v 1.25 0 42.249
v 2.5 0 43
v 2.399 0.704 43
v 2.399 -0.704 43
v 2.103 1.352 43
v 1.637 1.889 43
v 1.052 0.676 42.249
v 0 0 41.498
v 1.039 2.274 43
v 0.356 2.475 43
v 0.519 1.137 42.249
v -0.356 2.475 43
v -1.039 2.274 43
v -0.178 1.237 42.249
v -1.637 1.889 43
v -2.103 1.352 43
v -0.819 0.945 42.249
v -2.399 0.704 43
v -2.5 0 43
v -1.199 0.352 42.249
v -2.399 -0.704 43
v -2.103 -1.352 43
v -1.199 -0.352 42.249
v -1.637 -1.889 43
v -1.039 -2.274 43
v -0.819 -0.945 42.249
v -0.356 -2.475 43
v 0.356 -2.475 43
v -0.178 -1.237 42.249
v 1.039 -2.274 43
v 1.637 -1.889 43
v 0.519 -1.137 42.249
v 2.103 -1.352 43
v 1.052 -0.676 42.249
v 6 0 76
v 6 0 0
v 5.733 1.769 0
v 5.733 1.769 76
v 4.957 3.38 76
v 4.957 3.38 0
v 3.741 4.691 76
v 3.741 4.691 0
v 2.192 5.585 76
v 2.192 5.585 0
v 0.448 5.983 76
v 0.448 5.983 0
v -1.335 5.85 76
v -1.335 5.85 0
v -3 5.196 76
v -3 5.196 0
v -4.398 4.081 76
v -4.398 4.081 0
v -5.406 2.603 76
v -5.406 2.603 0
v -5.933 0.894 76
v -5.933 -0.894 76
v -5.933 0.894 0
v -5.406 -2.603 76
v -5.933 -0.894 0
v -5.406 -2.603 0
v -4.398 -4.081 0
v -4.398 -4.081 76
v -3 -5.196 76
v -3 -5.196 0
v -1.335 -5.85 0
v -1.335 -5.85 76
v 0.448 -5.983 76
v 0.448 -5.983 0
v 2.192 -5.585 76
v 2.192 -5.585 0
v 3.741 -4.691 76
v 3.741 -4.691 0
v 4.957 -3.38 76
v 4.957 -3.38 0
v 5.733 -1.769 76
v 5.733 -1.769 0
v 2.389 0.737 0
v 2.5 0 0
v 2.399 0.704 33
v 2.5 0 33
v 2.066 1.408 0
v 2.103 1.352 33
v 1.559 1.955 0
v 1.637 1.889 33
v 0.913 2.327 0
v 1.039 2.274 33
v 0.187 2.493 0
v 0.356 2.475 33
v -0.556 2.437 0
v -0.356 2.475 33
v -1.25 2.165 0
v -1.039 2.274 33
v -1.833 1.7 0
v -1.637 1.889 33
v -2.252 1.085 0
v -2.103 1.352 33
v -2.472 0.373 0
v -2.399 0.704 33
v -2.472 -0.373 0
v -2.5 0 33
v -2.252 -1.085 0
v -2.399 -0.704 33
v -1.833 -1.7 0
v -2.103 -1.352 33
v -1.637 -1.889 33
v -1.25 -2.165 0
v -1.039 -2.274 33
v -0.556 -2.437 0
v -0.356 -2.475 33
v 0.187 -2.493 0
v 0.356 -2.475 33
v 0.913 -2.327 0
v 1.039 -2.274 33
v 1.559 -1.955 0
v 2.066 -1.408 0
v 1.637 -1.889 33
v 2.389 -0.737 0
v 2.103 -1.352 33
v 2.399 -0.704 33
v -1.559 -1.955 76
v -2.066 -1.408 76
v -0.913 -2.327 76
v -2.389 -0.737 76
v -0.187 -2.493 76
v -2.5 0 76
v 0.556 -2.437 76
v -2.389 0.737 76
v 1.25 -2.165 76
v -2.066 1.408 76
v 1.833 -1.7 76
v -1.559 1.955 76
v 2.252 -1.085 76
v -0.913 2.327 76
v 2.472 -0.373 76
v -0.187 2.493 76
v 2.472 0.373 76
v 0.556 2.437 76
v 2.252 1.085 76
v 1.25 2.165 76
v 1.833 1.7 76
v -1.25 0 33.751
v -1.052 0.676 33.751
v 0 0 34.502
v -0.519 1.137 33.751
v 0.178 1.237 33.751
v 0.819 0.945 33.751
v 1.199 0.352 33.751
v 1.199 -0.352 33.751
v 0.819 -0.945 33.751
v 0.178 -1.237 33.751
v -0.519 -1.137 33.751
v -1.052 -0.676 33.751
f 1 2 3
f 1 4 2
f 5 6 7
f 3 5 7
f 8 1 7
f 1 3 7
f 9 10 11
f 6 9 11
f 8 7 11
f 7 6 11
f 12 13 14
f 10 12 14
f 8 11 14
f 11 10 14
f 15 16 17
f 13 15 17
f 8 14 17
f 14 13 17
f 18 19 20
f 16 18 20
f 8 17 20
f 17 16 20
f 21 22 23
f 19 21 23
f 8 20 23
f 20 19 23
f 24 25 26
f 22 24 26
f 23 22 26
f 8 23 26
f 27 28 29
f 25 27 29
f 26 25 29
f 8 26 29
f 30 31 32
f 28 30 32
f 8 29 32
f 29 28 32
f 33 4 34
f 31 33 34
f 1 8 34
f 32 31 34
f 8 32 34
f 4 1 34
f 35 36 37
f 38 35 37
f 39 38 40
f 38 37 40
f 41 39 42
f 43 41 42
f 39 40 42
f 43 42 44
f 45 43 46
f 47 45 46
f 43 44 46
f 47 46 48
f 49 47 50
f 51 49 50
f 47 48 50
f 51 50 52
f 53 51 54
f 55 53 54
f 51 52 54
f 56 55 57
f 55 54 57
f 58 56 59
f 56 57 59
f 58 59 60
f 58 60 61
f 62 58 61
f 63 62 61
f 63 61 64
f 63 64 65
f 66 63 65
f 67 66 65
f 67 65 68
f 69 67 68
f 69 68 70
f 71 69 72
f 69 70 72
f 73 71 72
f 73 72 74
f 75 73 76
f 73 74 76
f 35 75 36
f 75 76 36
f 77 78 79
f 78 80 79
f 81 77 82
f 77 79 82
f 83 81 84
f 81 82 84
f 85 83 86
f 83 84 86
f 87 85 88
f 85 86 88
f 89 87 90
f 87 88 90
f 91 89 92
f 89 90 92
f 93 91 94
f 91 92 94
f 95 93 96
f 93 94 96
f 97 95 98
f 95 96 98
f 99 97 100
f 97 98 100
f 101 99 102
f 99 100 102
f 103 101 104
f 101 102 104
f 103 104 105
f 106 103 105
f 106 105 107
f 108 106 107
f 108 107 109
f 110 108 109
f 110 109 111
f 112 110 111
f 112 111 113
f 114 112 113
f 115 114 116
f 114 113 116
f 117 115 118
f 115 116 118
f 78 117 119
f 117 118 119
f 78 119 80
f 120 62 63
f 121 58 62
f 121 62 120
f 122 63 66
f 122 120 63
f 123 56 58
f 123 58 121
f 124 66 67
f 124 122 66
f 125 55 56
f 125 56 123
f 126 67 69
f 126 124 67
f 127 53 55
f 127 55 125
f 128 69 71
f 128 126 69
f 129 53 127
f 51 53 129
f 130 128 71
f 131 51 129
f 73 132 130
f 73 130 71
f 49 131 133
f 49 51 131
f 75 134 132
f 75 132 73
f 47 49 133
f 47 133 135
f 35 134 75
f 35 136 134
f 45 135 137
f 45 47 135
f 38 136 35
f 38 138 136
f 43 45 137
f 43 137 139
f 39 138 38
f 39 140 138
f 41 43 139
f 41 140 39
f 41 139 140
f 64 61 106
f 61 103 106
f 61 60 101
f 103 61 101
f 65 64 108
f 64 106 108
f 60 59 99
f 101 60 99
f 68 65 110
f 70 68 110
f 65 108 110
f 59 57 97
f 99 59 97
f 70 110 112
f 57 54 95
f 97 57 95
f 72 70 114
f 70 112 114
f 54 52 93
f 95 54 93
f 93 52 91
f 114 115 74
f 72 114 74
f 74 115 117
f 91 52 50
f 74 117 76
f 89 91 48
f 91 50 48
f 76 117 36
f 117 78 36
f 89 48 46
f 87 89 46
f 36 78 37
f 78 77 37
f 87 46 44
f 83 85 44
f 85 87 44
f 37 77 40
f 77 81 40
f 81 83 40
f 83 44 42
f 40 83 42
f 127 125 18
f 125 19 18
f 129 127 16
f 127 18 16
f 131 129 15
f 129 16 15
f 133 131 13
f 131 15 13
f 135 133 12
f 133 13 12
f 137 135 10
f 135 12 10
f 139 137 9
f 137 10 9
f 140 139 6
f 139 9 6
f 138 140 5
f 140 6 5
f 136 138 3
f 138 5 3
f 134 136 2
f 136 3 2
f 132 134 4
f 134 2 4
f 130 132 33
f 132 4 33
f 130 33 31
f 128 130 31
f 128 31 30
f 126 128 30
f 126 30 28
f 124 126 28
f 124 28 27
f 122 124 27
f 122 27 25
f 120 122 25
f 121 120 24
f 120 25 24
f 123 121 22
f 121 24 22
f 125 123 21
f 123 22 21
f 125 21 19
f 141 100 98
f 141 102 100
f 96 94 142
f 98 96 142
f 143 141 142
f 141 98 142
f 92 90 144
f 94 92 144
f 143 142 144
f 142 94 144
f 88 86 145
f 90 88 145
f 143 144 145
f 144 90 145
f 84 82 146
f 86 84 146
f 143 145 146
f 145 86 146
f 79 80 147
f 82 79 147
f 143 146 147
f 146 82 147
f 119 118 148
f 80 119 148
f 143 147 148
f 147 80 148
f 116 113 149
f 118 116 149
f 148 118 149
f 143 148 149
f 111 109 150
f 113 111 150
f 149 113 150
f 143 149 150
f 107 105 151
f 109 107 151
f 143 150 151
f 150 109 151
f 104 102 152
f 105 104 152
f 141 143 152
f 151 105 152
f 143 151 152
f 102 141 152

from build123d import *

# Parameters (mm, degrees)
SKETCH_1_R             = 6
EXTRUDE_1_DEPTH        = 76
HOLE_WIZARD_M6_1_D     = 5
HOLE_WIZARD_M6_1_DEPTH = 33
HOLE_WIZARD_M6_1_TIP   = 1.502151548
HOLE_WIZARD_M6_2_D     = 5
HOLE_WIZARD_M6_2_DEPTH = 33
HOLE_WIZARD_M6_2_TIP   = 1.502151548


with BuildPart() as part:
    # 草图1 → 凸台-拉伸1 (new body)
    with BuildSketch(Plane.XY):
        Circle(SKETCH_1_R)
    extrude(amount=EXTRUDE_1_DEPTH)

    # M6 螺纹孔1
    with Locations(Plane.XY.offset(76)):
        with Locations((0, 0)):
            Hole(HOLE_WIZARD_M6_1_D / 2, depth=HOLE_WIZARD_M6_1_DEPTH)
            with Locations((0, 0, -(HOLE_WIZARD_M6_1_DEPTH + HOLE_WIZARD_M6_1_TIP / 2))):  # 118° drill point
                Cone(0, HOLE_WIZARD_M6_1_D / 2, HOLE_WIZARD_M6_1_TIP, mode=Mode.SUBTRACT)

    # M6 螺纹孔2
    with Locations(Plane(origin=(0, 0, 0), x_dir=(-1, 0, 0), z_dir=(0, 0, -1))):
        with Locations((0, 0)):
            Hole(HOLE_WIZARD_M6_2_D / 2, depth=HOLE_WIZARD_M6_2_DEPTH)
            with Locations((0, 0, -(HOLE_WIZARD_M6_2_DEPTH + HOLE_WIZARD_M6_2_TIP / 2))):  # 118° drill point
                Cone(0, HOLE_WIZARD_M6_2_D / 2, HOLE_WIZARD_M6_2_TIP, mode=Mode.SUBTRACT)


solid = part.part
